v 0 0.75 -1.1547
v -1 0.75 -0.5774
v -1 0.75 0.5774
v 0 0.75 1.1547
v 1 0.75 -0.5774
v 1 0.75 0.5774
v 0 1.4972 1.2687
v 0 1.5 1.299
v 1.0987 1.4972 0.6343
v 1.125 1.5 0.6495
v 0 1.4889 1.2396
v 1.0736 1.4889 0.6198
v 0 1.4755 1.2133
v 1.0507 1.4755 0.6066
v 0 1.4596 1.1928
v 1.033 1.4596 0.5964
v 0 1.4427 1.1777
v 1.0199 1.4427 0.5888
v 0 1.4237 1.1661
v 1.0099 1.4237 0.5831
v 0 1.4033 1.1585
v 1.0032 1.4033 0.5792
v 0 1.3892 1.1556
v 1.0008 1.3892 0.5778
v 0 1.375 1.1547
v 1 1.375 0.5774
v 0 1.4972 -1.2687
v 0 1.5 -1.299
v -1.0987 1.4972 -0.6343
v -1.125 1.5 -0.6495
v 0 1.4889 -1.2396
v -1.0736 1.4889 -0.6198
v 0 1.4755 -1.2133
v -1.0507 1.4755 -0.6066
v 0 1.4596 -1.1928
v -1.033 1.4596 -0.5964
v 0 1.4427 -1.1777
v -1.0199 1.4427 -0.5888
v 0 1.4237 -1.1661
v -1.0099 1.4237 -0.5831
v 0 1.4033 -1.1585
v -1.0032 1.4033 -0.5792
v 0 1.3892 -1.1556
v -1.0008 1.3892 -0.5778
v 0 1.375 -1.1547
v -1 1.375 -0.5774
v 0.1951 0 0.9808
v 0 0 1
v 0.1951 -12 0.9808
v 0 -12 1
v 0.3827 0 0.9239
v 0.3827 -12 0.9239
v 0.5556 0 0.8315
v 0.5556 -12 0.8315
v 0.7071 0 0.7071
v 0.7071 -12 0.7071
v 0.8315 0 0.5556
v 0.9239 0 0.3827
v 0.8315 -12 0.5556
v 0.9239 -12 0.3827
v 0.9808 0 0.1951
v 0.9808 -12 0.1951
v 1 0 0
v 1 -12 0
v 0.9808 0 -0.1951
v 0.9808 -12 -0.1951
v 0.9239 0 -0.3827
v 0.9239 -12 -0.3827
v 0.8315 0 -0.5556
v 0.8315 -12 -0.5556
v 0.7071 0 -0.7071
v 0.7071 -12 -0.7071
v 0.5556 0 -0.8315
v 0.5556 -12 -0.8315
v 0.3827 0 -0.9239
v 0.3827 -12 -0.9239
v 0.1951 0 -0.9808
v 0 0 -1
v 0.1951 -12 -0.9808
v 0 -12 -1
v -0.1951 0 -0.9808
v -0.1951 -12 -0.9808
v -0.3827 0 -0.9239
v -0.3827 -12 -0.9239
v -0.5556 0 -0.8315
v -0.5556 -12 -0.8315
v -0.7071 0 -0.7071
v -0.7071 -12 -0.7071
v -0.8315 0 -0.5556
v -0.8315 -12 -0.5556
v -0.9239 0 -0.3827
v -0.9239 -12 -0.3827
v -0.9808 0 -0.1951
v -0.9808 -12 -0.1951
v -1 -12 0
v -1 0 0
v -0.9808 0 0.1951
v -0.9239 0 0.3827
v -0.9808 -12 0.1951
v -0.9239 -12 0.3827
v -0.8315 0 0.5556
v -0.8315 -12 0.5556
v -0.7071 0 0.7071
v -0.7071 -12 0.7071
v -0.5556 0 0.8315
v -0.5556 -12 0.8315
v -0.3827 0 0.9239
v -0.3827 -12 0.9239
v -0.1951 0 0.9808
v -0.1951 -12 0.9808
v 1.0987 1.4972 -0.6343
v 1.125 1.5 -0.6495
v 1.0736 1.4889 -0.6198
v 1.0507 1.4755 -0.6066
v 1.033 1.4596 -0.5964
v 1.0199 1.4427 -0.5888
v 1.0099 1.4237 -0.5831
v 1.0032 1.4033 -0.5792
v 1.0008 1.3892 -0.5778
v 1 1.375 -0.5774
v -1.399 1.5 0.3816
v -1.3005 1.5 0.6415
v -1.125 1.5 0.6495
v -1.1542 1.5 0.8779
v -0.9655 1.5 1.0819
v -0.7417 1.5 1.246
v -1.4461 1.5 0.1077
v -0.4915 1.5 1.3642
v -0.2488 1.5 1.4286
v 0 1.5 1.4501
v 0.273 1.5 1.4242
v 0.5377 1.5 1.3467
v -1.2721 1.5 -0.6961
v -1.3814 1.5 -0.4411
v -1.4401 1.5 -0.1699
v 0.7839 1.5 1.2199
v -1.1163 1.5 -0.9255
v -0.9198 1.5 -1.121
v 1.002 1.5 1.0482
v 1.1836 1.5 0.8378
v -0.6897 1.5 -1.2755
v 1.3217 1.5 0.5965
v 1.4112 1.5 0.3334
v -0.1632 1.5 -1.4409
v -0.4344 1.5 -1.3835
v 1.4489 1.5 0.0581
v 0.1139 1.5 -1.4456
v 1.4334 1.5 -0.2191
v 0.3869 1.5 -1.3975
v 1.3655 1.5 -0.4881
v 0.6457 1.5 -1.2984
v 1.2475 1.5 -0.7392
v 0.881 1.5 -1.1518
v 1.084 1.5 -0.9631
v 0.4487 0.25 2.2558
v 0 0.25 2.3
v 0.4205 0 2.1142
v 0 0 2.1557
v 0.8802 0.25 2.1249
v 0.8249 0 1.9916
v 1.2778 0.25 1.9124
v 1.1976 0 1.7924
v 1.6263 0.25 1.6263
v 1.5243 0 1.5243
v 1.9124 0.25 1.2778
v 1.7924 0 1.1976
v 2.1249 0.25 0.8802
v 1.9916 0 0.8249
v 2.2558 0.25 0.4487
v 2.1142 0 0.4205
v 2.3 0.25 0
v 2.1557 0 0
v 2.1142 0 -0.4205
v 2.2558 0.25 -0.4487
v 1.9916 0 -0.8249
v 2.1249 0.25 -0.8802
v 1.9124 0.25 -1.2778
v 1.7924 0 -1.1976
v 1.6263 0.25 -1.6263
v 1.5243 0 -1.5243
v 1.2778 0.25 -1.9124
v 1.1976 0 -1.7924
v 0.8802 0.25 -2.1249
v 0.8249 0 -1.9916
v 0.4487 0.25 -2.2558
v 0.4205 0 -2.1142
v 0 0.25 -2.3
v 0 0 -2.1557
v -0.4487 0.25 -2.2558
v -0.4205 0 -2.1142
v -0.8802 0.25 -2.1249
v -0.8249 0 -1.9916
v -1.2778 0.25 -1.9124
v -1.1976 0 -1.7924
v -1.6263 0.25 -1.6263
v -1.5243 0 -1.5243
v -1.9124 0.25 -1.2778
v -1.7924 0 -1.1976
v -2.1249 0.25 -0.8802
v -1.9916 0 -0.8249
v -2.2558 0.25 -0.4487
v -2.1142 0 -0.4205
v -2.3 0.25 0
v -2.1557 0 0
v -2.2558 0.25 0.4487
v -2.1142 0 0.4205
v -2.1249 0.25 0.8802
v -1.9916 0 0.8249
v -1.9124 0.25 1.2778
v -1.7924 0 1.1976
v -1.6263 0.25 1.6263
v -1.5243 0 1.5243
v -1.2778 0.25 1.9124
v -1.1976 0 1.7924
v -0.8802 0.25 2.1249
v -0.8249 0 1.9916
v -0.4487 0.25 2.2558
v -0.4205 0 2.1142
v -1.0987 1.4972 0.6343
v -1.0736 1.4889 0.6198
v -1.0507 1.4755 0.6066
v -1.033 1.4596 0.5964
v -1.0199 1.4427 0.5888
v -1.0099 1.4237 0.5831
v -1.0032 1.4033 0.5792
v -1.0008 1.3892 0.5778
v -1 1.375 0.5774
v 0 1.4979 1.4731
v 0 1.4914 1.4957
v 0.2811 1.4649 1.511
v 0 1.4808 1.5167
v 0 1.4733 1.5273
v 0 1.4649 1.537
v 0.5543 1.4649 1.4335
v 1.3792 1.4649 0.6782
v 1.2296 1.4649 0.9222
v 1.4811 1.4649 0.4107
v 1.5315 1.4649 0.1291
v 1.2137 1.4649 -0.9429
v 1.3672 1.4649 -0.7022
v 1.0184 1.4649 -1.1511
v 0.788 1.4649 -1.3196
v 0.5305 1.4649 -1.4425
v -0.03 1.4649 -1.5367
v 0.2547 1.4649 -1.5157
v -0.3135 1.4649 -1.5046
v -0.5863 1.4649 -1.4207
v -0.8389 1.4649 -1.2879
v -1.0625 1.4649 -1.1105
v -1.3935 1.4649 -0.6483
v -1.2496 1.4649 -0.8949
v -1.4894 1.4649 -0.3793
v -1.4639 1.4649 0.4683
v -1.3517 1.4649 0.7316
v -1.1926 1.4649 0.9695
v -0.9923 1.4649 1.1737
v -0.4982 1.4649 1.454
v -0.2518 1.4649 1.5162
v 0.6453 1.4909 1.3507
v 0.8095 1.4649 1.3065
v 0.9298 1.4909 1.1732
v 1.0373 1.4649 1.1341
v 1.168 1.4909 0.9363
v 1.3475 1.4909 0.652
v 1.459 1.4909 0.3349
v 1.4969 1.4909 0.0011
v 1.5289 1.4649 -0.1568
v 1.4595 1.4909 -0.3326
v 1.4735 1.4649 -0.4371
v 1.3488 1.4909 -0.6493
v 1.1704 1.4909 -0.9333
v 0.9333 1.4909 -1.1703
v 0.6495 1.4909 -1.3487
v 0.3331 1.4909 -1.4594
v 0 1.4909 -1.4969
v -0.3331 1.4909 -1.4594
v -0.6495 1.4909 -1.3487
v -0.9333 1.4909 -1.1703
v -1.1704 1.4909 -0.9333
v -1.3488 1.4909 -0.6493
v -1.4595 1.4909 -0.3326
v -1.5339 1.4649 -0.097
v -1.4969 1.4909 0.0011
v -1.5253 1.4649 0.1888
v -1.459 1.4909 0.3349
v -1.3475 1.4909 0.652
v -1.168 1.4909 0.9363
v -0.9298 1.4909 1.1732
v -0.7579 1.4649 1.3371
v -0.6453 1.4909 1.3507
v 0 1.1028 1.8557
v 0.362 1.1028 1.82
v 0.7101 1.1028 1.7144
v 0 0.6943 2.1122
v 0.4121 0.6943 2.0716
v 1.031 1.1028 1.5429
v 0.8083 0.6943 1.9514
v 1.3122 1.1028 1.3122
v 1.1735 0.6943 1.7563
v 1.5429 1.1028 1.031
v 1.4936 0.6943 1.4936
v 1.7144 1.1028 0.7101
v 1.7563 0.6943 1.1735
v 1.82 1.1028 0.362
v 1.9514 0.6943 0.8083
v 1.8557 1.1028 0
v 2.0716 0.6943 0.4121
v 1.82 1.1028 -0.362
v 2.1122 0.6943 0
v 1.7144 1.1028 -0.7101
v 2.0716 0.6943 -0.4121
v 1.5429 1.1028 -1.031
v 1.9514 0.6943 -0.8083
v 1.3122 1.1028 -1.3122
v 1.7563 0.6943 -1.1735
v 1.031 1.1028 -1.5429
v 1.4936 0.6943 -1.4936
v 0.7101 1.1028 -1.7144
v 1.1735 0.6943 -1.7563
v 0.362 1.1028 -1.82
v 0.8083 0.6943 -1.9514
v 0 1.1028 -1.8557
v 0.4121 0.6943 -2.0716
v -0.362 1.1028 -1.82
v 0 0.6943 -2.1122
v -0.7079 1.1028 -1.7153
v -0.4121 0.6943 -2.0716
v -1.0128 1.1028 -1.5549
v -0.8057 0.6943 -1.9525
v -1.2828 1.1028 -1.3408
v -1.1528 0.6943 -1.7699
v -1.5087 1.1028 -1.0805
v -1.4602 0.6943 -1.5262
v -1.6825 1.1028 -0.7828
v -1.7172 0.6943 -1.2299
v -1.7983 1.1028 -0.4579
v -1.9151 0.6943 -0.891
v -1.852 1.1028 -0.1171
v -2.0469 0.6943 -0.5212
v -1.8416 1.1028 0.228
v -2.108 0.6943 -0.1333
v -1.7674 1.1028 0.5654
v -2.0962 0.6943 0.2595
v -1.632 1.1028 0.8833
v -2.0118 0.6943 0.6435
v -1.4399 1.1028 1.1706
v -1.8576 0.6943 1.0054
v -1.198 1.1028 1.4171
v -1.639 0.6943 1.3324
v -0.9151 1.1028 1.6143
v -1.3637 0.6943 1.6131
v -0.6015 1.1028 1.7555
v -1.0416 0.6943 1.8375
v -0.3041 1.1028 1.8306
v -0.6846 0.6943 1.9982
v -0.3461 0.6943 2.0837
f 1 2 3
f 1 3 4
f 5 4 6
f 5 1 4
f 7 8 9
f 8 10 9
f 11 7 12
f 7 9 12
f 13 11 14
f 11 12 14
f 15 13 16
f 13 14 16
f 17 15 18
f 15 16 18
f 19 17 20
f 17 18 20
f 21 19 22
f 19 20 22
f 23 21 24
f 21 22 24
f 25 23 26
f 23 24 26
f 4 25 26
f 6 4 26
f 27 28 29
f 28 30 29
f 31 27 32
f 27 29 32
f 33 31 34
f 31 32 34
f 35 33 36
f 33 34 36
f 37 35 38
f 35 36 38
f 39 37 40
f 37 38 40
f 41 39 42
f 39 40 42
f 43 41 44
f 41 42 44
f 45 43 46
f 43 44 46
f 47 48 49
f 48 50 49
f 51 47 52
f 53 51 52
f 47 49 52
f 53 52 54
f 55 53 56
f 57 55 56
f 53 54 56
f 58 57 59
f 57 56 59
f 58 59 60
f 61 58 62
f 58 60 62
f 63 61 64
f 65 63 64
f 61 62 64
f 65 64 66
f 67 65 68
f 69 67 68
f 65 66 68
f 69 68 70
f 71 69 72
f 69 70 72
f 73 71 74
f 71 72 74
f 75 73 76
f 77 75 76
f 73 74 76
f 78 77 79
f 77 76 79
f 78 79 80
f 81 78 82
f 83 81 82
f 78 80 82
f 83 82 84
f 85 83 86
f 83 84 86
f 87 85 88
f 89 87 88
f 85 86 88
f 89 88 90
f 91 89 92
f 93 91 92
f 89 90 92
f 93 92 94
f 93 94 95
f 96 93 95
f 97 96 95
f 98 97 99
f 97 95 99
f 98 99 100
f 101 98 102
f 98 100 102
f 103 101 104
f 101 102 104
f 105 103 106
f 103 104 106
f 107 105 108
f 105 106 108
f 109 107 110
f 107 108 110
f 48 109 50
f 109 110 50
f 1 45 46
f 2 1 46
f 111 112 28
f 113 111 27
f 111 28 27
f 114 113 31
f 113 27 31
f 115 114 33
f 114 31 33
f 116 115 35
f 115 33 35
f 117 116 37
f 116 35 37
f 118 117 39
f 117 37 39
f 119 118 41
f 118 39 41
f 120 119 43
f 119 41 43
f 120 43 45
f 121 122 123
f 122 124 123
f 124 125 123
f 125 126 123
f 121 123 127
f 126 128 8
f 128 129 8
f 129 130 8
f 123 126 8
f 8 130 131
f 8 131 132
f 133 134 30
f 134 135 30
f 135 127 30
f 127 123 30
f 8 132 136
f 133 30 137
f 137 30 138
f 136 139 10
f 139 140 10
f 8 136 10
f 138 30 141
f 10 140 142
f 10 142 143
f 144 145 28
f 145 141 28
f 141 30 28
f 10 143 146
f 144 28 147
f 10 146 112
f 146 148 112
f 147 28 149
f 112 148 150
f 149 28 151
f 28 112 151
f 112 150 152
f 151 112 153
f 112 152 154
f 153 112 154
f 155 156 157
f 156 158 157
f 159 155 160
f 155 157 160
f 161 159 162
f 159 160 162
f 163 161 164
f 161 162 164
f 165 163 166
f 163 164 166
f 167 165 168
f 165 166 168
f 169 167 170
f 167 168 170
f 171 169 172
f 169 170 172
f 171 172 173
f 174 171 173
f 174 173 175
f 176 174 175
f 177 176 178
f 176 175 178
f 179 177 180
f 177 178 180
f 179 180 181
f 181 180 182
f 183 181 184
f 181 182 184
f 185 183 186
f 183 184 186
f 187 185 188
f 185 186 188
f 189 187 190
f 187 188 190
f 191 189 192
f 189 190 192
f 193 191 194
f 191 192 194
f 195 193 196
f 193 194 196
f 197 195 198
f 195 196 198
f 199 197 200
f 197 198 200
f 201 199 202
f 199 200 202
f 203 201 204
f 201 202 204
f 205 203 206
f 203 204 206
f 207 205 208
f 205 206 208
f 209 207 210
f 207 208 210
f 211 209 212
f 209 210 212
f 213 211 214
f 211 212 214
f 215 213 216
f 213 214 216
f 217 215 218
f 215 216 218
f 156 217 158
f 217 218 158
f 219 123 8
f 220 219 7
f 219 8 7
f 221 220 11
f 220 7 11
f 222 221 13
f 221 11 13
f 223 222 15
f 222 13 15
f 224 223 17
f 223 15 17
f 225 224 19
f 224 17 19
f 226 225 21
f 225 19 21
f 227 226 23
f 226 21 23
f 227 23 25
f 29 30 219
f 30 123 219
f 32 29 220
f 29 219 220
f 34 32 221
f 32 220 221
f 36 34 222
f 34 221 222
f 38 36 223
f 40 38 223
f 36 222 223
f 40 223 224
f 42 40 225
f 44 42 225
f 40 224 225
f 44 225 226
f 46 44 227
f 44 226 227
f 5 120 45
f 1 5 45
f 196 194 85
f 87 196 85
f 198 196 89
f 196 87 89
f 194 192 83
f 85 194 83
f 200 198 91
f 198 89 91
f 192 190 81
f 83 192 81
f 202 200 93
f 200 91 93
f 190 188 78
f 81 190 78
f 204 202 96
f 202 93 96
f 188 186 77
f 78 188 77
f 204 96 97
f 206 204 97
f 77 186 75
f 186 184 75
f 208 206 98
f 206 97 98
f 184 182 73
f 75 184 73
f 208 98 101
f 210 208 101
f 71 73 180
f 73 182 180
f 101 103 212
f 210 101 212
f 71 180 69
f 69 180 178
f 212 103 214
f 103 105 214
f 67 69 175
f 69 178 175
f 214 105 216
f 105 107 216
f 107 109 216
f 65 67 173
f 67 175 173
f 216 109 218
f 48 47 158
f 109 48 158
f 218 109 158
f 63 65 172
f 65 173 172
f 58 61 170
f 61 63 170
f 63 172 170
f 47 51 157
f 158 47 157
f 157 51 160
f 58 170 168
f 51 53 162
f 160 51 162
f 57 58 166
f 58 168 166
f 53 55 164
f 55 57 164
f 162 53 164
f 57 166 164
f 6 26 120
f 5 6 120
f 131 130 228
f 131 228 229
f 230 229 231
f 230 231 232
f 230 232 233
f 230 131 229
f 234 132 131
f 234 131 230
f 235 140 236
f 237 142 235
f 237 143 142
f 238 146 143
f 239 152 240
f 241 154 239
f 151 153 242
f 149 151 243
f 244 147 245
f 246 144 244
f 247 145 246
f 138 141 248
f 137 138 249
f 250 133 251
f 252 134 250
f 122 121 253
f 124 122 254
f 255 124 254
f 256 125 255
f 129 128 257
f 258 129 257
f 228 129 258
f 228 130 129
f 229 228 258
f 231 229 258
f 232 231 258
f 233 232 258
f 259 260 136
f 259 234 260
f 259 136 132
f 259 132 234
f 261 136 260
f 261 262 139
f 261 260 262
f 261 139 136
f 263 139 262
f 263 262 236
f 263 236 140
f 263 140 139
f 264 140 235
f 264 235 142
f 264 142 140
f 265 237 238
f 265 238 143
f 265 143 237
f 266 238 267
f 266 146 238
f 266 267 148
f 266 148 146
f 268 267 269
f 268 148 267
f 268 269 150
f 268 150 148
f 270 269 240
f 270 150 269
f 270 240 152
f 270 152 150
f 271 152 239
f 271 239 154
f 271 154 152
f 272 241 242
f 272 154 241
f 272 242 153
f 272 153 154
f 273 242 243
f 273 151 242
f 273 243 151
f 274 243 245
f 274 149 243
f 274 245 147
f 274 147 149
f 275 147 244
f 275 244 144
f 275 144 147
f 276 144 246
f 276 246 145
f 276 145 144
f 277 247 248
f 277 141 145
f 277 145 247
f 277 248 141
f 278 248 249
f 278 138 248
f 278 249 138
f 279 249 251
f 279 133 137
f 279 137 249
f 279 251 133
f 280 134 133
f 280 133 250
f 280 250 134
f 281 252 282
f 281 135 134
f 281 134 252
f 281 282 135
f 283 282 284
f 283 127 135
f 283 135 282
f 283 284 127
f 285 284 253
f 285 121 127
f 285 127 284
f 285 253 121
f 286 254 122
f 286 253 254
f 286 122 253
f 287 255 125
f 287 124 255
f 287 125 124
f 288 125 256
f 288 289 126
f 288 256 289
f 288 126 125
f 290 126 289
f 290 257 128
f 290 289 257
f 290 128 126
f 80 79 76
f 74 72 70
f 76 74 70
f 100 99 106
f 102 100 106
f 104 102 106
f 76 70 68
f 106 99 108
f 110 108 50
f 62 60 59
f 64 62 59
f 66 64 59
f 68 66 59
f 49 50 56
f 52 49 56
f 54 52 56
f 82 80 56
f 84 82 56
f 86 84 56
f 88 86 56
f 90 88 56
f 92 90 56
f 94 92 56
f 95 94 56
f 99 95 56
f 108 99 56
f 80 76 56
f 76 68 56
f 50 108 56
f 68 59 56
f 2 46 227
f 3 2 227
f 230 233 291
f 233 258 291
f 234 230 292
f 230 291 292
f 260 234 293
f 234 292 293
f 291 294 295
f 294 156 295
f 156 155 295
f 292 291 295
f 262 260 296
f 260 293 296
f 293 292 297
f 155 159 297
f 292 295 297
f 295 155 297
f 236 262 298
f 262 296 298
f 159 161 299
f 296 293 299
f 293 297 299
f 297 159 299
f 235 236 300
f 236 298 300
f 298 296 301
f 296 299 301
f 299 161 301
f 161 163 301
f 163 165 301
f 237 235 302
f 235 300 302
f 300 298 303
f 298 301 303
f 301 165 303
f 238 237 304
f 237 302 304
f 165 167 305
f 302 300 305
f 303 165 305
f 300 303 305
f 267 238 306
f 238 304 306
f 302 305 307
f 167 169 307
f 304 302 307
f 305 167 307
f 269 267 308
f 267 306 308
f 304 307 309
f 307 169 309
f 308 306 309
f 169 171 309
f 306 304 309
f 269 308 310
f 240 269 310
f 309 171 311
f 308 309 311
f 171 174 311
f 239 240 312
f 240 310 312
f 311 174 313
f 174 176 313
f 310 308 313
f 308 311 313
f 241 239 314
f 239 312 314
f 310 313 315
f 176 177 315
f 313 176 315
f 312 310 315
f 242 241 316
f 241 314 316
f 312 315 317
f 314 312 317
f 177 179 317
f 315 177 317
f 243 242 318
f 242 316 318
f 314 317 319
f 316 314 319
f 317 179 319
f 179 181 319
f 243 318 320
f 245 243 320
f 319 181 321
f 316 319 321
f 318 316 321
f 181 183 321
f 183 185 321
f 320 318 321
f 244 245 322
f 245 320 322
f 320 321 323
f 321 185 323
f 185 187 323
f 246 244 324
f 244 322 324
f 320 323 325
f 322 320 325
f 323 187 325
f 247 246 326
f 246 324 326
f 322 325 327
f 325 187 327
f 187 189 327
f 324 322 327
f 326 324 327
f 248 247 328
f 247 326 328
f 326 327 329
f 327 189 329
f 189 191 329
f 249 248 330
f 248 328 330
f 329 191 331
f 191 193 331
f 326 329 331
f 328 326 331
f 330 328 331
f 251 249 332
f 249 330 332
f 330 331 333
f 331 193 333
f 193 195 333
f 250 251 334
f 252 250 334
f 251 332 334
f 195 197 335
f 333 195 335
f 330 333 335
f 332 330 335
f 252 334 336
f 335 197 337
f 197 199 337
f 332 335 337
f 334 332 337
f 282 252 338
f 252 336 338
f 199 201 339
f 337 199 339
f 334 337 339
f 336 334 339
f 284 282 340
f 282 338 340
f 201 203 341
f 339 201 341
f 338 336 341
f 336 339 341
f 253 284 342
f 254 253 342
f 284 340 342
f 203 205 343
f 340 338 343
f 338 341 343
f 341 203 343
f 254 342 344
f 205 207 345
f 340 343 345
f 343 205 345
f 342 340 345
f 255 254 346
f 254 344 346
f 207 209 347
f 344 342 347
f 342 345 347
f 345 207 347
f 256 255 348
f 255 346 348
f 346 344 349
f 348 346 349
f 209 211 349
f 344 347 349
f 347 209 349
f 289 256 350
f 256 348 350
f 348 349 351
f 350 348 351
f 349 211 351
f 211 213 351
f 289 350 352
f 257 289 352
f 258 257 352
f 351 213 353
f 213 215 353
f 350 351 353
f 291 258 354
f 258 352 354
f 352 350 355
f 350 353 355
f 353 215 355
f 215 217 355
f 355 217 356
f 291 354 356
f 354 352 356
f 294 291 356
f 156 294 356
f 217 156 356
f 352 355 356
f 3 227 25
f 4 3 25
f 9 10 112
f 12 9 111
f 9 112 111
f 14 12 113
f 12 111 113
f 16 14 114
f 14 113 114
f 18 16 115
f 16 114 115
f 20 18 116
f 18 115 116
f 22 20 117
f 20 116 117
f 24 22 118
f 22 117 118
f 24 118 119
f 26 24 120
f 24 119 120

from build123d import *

# Parameters (mm, degrees)
CUT_EXTRUDE1_DEPTH = 0.75
FILLET1_R          = 0.125


with BuildPart() as part:
    # Sketch1 → Revolve1 (revolve)
    with BuildSketch(Plane(origin=(0, 0, 0), x_dir=(0, 0, -1), z_dir=(1, 0, 0))):
        with BuildLine():
            Line((0, 1.5), (-1.5, 1.5))
            ThreePointArc((-1.5, 1.5), (-1.978515811, 0.925250119), (-2.3, 0.25))
            Line((-2.3, 0.25), (-2.155662433, 0))
            Line((-2.155662433, 0), (-1, 0))
            Line((-1, 0), (-1, -12))
            Line((-1, -12), (0, -12))
            Line((0, -12), (0, 1.5))
        make_face()
    revolve(axis=Axis((0, -12, 0), (0, 1, 0)))

    # Sketch2 → Cut-Extrude1 (cut)
    with BuildSketch(Plane(origin=(0, 1.5, 0), x_dir=(1, 0, 0), z_dir=(0, 1, 0))):
        Polygon((0, 1.154700538), (-1, 0.577350269), (-1, -0.577350269), (0, -1.154700538), (1, -0.577350269), (1, 0.577350269), align=None)
    extrude(amount=-CUT_EXTRUDE1_DEPTH, mode=Mode.SUBTRACT)

    # Fillet1
    fillet1_edges = [part.edges().sort_by_distance(p)[0] for p in [
        (0.5, 1.5, -0.866025404),
        (-0.5, 1.5, -0.866025404),
        (-1, 1.5, 0),
        (-0.5, 1.5, 0.866025404),
        (0.5, 1.5, 0.866025404),
        (1, 1.5, 0),
        (0, 1.5, -1.5),
    ]]
    fillet(fillet1_edges, radius=FILLET1_R)


solid = part.part
